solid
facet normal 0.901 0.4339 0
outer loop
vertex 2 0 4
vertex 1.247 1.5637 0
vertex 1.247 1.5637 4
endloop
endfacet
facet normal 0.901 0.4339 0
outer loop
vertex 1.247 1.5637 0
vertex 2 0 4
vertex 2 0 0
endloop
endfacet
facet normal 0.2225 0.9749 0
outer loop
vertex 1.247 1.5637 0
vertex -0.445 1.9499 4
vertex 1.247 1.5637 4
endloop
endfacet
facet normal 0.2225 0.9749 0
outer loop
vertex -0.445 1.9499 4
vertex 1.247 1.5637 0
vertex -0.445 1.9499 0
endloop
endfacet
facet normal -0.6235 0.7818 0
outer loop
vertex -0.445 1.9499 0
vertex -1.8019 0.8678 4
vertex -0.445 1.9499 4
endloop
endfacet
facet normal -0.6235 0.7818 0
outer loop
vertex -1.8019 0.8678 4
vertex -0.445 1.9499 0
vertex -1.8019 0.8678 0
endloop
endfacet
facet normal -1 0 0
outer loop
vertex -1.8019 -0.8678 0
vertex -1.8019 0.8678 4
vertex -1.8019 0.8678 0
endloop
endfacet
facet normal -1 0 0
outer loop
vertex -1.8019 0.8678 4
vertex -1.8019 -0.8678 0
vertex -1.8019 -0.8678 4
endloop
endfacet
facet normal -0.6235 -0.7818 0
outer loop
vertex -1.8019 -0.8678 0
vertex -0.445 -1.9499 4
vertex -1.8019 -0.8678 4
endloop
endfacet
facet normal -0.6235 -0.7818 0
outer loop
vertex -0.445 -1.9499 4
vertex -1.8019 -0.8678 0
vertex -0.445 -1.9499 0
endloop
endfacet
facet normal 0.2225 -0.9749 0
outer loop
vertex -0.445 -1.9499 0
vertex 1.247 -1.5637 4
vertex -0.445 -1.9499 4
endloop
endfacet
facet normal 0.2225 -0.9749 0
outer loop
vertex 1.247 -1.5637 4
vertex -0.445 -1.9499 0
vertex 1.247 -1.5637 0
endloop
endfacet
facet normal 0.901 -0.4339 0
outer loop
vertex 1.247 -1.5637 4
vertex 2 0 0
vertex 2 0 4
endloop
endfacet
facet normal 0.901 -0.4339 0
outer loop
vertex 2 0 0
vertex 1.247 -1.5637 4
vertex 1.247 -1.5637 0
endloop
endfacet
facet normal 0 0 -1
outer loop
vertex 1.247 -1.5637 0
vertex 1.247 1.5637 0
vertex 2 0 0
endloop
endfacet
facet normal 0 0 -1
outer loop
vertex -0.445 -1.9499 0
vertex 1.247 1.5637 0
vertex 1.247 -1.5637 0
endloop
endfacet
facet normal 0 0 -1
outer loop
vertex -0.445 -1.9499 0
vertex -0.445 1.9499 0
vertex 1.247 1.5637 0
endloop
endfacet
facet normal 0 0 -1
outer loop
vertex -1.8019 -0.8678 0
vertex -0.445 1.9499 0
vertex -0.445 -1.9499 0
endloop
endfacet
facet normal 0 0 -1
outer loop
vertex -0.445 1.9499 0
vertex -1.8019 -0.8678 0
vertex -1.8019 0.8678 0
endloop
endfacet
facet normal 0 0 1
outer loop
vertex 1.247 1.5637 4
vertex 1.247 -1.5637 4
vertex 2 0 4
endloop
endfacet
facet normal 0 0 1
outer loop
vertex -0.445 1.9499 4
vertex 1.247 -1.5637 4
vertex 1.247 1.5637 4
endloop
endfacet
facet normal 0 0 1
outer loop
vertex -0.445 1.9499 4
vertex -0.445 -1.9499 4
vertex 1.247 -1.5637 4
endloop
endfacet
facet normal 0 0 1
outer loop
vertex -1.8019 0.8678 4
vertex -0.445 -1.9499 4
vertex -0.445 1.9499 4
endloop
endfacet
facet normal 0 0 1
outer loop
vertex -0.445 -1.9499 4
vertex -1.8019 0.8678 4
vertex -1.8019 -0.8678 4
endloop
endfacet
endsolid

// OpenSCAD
// Exported through the exchange writers, which need the retained B-Rep rather than a mesh.
cylinder(r = 2, h = 4);
